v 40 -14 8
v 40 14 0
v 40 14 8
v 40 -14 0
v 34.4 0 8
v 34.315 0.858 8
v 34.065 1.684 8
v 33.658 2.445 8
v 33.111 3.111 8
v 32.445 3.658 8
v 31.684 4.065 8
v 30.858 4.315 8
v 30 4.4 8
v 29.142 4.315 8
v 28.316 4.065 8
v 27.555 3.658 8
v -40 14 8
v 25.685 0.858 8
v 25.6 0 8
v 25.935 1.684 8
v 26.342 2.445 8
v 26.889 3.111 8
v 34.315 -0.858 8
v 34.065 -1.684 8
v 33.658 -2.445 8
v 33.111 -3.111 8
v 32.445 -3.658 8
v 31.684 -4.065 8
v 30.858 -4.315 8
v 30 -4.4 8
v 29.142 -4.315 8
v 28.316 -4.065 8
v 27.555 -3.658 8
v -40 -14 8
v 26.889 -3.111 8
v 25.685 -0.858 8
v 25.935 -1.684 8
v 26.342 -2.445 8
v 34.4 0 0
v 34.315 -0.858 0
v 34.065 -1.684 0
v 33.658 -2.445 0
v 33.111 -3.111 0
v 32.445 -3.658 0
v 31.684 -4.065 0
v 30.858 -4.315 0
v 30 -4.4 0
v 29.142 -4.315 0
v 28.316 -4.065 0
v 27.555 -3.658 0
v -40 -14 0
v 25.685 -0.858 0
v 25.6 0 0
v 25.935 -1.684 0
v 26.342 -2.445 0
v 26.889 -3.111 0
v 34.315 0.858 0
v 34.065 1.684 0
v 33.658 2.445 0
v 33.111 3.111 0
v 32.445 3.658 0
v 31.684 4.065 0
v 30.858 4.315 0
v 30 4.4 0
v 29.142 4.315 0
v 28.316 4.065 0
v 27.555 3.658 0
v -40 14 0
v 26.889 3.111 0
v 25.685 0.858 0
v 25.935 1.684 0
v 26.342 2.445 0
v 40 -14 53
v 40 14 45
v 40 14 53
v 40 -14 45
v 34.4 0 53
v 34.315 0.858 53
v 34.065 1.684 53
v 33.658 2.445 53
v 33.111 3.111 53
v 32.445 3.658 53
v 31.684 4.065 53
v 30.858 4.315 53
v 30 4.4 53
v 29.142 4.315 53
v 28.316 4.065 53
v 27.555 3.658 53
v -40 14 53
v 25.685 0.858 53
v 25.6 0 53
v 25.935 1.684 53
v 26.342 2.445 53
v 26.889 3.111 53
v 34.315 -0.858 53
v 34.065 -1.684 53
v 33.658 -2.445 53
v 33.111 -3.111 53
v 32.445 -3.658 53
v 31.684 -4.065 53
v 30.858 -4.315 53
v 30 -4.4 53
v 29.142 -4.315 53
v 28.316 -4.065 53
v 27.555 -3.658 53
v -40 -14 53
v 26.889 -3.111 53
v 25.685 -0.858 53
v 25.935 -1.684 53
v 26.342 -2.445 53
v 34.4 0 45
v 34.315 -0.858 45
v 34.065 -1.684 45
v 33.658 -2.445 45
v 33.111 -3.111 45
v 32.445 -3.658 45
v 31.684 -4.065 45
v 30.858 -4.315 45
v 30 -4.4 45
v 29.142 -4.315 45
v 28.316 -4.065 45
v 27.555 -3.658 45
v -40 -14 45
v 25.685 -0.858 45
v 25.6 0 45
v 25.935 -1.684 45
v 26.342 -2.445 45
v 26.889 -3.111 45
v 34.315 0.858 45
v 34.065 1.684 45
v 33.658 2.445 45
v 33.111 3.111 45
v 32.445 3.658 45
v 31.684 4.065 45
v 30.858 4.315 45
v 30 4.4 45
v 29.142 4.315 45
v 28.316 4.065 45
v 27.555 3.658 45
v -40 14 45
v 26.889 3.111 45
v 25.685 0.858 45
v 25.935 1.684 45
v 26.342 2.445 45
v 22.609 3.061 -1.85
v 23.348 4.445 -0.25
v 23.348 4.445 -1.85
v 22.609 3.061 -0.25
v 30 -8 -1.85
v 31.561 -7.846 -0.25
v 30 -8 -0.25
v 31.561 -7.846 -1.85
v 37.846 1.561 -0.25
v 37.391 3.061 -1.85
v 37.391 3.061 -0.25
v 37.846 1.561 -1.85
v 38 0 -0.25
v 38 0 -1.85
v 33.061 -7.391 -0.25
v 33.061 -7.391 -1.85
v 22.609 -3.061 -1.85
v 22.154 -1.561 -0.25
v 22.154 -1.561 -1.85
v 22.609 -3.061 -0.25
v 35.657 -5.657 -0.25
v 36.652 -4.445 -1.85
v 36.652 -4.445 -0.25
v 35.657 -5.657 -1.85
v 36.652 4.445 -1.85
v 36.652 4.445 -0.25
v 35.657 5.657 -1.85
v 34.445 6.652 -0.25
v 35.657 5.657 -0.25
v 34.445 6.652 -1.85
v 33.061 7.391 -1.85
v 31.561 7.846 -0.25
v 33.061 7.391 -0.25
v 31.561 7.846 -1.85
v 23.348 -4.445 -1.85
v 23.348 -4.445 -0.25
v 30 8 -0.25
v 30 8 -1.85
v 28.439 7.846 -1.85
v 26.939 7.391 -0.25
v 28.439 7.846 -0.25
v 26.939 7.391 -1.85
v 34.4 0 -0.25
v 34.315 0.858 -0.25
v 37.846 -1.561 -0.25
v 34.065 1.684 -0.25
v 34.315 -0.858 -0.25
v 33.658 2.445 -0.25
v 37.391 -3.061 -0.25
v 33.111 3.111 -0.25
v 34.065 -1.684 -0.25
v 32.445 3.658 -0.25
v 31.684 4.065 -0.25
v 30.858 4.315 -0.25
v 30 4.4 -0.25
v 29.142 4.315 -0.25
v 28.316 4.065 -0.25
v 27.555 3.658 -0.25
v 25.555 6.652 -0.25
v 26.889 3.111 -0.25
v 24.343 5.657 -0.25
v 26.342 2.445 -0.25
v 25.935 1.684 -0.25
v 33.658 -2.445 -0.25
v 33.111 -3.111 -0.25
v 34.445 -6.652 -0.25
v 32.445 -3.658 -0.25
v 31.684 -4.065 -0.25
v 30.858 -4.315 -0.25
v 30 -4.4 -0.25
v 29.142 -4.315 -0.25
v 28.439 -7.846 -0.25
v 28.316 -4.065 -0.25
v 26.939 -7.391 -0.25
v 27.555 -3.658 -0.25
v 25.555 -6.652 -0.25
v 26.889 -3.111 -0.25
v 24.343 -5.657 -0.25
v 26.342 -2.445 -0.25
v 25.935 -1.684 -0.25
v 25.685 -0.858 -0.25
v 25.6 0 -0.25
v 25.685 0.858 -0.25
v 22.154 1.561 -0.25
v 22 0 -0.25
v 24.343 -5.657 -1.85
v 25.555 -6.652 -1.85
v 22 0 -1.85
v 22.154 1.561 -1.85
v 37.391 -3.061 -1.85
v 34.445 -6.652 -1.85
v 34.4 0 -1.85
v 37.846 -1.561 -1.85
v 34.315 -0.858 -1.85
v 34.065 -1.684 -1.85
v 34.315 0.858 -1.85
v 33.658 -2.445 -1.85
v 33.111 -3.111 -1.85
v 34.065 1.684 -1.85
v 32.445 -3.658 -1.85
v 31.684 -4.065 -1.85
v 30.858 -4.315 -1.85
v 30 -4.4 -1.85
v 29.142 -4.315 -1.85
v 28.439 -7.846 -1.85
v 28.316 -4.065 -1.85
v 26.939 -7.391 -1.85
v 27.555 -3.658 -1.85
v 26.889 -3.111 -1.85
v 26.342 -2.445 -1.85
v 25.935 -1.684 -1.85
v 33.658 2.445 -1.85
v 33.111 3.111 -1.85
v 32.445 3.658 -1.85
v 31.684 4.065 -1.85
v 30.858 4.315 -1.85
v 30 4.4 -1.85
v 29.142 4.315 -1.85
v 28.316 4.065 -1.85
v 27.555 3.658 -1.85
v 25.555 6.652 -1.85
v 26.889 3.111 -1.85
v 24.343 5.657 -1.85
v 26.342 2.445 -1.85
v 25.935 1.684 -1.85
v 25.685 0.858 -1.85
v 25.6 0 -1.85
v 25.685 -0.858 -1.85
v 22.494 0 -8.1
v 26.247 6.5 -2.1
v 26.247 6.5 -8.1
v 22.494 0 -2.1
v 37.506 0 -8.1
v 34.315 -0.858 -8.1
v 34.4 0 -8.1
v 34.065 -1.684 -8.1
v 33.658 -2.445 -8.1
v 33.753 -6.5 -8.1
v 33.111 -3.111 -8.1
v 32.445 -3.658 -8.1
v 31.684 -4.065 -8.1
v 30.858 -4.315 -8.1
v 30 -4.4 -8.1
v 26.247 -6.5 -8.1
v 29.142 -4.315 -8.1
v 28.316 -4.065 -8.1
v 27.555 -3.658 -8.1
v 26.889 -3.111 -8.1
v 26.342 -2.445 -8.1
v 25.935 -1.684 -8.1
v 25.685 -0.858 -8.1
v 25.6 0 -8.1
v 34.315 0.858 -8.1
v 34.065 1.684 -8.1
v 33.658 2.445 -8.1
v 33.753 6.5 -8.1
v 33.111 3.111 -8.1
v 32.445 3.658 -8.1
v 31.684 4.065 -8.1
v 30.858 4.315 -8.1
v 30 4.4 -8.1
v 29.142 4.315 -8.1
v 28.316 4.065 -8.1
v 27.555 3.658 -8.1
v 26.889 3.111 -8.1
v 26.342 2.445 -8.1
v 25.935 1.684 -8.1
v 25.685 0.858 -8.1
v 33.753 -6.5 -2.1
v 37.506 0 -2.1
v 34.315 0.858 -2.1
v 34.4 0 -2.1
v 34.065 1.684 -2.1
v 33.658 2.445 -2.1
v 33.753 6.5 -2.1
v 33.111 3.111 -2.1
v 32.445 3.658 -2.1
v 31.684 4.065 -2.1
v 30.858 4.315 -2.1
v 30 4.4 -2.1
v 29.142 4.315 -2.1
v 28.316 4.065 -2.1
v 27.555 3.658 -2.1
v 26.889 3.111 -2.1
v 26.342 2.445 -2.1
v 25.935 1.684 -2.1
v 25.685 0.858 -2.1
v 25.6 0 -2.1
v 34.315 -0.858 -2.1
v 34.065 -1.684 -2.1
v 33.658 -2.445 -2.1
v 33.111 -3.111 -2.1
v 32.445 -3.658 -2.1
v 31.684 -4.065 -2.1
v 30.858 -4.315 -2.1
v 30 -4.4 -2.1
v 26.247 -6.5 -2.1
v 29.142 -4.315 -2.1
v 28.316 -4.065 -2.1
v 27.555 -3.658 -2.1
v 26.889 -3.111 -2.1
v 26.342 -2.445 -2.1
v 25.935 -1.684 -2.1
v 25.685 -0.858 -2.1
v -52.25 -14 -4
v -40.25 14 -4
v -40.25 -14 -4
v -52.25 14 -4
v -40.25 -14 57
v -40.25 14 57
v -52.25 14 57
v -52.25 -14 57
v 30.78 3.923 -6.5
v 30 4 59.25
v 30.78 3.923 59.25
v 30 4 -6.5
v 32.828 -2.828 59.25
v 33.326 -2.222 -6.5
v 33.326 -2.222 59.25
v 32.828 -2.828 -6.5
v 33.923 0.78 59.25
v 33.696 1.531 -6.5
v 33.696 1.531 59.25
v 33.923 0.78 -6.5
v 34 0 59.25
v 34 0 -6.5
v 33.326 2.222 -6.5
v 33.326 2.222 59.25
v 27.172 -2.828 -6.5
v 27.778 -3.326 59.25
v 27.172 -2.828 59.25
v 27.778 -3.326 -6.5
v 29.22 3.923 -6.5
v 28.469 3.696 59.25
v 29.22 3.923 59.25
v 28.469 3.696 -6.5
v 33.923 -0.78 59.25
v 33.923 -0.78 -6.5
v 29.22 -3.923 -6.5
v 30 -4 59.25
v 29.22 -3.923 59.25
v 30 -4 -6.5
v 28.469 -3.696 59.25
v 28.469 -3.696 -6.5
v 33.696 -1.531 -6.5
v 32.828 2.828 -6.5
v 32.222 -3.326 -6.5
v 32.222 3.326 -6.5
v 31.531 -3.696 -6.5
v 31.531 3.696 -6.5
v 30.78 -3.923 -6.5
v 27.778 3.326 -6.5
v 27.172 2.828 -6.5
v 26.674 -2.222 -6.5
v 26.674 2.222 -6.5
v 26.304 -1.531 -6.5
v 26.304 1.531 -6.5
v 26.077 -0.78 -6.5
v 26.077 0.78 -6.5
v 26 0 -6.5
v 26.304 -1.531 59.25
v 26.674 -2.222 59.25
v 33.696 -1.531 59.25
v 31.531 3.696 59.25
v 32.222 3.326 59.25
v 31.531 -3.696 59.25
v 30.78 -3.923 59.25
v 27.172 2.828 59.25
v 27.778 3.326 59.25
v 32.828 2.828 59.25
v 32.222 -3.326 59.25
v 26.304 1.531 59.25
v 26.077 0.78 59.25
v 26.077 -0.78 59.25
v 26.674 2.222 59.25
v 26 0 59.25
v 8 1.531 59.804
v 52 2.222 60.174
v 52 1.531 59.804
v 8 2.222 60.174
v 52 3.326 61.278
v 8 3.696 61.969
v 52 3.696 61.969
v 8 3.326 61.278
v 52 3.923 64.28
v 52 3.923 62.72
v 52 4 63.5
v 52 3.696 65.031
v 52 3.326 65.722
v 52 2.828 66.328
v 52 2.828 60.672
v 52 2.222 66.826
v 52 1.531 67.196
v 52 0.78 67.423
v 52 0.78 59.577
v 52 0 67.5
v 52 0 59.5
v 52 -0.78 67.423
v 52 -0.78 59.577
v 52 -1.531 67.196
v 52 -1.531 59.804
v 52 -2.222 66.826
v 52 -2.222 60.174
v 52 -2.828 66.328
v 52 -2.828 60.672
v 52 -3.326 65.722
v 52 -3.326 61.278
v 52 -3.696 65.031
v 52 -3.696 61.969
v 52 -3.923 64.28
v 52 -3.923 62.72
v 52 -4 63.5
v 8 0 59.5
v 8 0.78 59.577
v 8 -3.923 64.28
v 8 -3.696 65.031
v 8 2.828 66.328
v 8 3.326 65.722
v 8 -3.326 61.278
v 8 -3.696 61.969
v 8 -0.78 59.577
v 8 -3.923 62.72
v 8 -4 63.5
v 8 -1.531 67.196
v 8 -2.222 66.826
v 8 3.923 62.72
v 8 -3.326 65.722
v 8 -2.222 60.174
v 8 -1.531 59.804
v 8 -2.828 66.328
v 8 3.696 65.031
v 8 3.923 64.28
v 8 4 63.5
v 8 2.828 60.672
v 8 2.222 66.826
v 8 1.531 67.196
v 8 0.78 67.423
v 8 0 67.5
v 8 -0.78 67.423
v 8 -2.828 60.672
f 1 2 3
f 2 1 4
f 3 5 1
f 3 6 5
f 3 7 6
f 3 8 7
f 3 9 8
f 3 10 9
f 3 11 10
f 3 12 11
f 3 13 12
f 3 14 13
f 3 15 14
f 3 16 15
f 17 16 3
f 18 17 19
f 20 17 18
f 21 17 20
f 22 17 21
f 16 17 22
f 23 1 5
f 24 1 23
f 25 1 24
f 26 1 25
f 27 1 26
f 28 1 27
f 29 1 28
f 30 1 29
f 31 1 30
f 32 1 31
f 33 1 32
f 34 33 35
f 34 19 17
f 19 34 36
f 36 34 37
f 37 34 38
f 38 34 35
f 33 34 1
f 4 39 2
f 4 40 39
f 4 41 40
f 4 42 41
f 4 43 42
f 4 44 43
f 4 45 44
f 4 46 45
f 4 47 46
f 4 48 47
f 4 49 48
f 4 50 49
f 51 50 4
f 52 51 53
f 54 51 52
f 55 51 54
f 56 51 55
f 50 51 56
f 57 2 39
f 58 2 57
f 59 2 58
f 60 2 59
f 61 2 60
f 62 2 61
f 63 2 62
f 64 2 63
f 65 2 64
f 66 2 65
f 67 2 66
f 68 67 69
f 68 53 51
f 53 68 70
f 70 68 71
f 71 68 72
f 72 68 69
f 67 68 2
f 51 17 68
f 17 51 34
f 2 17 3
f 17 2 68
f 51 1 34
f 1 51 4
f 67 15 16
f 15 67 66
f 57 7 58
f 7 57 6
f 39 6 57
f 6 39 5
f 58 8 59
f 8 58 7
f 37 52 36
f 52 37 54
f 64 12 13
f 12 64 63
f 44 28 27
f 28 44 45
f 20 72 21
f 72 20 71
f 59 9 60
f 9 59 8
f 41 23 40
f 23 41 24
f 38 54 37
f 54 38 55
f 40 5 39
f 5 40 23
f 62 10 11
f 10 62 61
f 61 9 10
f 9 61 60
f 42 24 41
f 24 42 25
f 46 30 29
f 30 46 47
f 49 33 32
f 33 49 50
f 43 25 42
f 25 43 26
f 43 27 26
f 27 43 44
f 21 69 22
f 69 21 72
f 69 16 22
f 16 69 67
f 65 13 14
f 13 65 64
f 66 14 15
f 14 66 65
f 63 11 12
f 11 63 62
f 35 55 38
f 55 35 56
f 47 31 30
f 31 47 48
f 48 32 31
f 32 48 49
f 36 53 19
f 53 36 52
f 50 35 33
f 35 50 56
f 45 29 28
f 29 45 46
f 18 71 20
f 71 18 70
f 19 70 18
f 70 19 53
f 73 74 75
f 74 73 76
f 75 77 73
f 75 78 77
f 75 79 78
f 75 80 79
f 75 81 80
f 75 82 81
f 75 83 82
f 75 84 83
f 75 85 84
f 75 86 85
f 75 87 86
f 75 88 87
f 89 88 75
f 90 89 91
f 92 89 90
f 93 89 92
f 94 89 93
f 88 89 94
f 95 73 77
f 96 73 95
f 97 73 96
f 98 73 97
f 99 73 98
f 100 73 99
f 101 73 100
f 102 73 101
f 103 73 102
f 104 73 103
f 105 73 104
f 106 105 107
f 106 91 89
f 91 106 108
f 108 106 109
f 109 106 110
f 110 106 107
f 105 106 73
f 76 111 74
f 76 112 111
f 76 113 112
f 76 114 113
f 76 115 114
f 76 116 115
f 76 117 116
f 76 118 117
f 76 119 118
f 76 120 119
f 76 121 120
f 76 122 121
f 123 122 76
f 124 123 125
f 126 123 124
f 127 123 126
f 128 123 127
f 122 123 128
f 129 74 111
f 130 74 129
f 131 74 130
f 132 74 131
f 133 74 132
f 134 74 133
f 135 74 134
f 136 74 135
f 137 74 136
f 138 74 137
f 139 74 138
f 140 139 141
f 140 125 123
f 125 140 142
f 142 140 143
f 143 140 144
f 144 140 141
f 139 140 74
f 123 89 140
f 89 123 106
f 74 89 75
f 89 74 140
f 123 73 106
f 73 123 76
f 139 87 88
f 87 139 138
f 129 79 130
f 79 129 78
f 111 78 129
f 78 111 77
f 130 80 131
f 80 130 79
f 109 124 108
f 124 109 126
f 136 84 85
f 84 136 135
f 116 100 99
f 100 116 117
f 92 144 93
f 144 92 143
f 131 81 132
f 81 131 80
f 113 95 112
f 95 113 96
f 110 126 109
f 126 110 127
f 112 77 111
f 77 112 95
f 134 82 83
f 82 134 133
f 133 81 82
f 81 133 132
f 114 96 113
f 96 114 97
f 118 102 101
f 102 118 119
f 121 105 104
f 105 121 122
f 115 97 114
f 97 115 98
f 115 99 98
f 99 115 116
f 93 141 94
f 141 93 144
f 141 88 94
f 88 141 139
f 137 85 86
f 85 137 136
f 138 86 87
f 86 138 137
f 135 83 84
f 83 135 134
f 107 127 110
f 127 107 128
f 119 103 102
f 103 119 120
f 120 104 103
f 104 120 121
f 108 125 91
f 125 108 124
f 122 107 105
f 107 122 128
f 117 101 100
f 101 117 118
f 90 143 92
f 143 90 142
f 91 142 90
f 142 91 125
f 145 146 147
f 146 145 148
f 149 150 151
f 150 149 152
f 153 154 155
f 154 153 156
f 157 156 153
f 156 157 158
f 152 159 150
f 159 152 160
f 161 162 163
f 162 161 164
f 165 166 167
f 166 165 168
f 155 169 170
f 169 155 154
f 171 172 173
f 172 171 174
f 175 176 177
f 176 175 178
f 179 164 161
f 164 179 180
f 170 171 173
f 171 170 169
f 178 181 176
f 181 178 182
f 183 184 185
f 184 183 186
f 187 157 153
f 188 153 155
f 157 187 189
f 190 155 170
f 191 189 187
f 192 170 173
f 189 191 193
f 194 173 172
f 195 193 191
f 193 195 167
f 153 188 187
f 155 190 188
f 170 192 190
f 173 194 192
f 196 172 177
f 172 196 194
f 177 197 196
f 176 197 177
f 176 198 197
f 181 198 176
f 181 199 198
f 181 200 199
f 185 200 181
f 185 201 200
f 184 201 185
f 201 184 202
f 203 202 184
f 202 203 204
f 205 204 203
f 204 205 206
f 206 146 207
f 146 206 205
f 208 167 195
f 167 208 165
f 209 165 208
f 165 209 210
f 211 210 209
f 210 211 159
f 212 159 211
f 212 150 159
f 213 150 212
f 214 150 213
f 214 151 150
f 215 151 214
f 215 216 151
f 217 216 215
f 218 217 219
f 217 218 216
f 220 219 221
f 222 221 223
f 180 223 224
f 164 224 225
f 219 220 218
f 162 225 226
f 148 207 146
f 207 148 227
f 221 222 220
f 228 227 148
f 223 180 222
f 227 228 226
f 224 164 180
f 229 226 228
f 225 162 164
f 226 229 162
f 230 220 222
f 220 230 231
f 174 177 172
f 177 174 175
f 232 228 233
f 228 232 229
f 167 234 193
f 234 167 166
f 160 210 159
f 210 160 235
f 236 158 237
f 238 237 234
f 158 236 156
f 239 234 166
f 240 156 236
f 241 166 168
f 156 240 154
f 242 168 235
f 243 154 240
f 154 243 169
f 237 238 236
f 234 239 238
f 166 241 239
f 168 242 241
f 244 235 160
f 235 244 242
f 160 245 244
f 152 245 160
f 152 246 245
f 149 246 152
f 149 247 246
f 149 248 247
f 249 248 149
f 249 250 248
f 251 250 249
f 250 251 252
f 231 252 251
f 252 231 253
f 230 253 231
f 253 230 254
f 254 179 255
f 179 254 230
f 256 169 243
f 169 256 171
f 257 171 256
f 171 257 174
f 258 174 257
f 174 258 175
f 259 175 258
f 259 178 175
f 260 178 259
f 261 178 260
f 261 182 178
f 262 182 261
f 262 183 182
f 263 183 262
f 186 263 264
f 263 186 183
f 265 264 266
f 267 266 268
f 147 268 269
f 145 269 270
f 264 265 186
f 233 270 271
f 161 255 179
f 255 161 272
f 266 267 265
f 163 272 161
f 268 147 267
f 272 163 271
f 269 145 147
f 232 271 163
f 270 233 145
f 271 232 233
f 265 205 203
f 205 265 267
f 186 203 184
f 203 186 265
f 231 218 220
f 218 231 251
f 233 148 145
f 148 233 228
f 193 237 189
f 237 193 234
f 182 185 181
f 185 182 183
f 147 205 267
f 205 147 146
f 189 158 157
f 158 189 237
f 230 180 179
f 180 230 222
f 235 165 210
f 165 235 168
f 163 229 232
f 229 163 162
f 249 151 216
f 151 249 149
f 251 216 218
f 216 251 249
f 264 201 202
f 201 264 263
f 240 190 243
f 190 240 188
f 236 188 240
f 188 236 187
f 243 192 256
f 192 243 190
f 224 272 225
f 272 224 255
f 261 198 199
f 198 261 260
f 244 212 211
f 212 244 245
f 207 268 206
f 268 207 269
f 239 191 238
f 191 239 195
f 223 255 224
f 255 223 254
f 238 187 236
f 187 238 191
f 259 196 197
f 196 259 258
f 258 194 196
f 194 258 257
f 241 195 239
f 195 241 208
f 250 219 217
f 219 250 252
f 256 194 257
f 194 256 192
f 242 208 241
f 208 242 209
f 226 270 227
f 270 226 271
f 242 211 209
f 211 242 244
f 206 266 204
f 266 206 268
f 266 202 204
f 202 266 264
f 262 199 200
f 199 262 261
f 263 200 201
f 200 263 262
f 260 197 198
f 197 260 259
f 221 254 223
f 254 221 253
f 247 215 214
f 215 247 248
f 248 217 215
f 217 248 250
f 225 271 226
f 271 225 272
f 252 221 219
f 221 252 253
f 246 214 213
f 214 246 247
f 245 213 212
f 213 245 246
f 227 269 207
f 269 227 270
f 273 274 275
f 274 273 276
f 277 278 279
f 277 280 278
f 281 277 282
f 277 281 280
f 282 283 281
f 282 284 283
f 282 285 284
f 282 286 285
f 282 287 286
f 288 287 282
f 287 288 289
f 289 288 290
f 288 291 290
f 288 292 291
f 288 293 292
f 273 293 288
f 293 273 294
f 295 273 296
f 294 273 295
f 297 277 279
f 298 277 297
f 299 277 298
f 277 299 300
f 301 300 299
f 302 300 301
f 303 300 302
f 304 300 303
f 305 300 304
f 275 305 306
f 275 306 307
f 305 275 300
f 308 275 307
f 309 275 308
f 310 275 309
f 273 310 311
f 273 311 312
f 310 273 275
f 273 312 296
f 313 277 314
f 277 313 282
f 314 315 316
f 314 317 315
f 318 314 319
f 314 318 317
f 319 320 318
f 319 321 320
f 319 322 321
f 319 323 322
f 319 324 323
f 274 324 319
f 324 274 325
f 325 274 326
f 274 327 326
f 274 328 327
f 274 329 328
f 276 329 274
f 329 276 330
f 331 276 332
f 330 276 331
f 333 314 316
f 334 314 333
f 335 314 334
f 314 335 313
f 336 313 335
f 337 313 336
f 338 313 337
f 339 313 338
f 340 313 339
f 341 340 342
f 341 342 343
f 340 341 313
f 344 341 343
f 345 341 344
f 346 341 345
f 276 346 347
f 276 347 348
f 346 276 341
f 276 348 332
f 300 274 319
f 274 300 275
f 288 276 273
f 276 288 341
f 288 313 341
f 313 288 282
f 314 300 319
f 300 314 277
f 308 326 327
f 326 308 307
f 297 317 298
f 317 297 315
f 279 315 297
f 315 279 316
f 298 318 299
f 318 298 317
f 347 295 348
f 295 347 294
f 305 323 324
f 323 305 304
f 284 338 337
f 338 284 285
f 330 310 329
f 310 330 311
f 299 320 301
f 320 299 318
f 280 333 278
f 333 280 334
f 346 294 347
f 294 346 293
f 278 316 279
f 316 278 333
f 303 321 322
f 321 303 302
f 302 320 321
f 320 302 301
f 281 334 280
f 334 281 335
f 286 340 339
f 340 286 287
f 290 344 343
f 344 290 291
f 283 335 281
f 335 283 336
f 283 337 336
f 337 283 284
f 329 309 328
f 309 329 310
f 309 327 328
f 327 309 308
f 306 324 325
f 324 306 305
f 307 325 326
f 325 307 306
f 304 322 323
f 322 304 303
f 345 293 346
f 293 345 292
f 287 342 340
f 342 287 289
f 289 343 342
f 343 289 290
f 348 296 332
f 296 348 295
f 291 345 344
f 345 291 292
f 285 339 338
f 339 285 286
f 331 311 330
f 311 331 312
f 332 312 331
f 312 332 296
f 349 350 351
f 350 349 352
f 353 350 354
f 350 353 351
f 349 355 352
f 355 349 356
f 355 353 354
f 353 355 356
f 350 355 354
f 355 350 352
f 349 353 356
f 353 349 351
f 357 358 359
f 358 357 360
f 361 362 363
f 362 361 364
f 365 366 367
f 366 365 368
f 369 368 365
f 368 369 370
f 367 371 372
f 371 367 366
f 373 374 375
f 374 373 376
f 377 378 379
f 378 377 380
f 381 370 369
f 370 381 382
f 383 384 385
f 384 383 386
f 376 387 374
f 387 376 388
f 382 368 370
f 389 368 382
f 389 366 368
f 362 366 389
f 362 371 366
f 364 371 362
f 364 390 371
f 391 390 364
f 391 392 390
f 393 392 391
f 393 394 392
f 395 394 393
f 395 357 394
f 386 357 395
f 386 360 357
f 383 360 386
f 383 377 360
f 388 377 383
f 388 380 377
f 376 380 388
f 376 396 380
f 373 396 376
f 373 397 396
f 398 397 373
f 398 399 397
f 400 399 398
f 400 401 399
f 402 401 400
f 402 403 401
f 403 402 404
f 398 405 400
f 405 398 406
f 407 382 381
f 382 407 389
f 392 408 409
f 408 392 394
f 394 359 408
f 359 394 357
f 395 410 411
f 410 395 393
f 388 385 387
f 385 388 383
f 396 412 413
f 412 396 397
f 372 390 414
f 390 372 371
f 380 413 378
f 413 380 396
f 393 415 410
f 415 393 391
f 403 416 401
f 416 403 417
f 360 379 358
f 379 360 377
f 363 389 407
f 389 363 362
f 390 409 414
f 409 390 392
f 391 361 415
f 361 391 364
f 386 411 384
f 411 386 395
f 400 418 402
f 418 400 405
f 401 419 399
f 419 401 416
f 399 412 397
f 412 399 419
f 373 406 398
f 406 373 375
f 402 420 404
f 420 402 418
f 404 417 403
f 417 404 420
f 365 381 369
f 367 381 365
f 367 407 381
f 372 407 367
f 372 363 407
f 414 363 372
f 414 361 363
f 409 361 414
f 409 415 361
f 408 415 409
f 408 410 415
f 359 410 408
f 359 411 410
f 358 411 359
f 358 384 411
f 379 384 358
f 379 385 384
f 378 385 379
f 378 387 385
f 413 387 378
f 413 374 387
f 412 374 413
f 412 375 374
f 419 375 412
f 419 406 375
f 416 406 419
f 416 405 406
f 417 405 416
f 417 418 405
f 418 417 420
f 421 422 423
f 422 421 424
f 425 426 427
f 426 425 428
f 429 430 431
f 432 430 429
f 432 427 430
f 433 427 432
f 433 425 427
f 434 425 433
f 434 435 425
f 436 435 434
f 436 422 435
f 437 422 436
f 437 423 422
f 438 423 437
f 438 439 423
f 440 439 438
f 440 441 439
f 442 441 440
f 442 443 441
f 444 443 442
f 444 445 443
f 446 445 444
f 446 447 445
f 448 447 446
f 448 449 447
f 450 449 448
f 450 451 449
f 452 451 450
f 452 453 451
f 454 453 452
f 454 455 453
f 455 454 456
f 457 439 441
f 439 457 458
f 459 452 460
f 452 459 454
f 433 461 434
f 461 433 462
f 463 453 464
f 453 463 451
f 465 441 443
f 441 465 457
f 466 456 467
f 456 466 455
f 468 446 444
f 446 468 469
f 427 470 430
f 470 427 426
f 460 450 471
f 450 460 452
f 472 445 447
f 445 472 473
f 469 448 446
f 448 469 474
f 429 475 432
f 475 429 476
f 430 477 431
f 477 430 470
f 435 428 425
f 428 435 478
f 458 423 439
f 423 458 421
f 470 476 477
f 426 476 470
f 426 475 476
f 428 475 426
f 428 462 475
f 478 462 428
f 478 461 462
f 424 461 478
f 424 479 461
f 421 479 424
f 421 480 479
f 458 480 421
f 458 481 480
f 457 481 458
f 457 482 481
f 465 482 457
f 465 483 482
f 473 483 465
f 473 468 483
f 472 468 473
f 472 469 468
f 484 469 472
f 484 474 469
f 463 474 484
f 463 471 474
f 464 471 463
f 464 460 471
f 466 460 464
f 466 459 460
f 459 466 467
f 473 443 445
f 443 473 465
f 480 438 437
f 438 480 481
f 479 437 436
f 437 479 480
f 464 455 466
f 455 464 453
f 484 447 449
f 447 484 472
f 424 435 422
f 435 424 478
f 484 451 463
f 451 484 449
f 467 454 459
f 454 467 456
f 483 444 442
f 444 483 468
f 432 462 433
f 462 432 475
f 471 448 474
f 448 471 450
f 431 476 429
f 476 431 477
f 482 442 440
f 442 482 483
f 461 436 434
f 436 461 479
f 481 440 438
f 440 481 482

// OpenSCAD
$fn = 32;

// ------------------------------------------------------------------------
// C clamp: throat 45 mm, screw d8
// Every part is its own module, assembly() places every instance.
// ------------------------------------------------------------------------

// --- part 1 ---
module clamp_arm() {
  difference() {
    translate([-40, -14, 0]) cube([80, 28, 8]);
    translate([30, 0, -1]) cylinder(h = 10, d = 8.8);
  }
}

// --- part 2 ---
module clamp_spine() {
  difference() {
    translate([-30.5, -14, 0]) cube([61, 28, 12]);
  }
}

// --- part 3 ---
module clamp_screw() {
  translate([0, 0, -32.875]) cylinder(h = 65.75, d = 8);
}

// --- part 4 ---
module clamp_washer() {
  difference() {
      translate([0, 0, 0]) cylinder(h = 1.6, d = 16);
      translate([0, 0, -1]) cylinder(h = 3.6, d = 8.8);
    }
}

// --- part 5 ---
module clamp_nut() {
  difference() {
    linear_extrude(height = 6) polygon(points = [[7.506, 0], [3.753, 6.5], [-3.753, 6.5], [-7.506, 0], [-3.753, -6.5], [3.753, -6.5]]);
    translate([0, 0, -1]) cylinder(h = 8, d = 8.8);
  }
}

// --- part 6 ---
module tommy_bar() {
  translate([0, 0, -22]) cylinder(h = 44, d = 8);
}

// --- assembly ---
module assembly() {
  color([0.80, 0.24, 0.20]) translate([0, 0, 0]) rotate([0, 0, 0]) clamp_arm();
  color([0.20, 0.45, 0.75]) translate([0, 0, 45]) rotate([0, 0, 0]) clamp_arm();
  color([0.25, 0.62, 0.32]) translate([-52.25, 0, 26.5]) rotate([0, 90, 0]) clamp_spine();
  color([0.92, 0.70, 0.18]) translate([30, 0, 26.375]) rotate([0, 0, 0]) clamp_screw();
  color([0.58, 0.35, 0.70]) translate([30, 0, -1.85]) rotate([0, 0, 0]) clamp_washer();
  color([0.16, 0.66, 0.66]) translate([30, 0, -8.1]) rotate([0, 0, 0]) clamp_nut();
  color([0.85, 0.48, 0.18]) translate([30, 0, 63.5]) rotate([0, 90, 0]) tommy_bar();
}

assembly();
